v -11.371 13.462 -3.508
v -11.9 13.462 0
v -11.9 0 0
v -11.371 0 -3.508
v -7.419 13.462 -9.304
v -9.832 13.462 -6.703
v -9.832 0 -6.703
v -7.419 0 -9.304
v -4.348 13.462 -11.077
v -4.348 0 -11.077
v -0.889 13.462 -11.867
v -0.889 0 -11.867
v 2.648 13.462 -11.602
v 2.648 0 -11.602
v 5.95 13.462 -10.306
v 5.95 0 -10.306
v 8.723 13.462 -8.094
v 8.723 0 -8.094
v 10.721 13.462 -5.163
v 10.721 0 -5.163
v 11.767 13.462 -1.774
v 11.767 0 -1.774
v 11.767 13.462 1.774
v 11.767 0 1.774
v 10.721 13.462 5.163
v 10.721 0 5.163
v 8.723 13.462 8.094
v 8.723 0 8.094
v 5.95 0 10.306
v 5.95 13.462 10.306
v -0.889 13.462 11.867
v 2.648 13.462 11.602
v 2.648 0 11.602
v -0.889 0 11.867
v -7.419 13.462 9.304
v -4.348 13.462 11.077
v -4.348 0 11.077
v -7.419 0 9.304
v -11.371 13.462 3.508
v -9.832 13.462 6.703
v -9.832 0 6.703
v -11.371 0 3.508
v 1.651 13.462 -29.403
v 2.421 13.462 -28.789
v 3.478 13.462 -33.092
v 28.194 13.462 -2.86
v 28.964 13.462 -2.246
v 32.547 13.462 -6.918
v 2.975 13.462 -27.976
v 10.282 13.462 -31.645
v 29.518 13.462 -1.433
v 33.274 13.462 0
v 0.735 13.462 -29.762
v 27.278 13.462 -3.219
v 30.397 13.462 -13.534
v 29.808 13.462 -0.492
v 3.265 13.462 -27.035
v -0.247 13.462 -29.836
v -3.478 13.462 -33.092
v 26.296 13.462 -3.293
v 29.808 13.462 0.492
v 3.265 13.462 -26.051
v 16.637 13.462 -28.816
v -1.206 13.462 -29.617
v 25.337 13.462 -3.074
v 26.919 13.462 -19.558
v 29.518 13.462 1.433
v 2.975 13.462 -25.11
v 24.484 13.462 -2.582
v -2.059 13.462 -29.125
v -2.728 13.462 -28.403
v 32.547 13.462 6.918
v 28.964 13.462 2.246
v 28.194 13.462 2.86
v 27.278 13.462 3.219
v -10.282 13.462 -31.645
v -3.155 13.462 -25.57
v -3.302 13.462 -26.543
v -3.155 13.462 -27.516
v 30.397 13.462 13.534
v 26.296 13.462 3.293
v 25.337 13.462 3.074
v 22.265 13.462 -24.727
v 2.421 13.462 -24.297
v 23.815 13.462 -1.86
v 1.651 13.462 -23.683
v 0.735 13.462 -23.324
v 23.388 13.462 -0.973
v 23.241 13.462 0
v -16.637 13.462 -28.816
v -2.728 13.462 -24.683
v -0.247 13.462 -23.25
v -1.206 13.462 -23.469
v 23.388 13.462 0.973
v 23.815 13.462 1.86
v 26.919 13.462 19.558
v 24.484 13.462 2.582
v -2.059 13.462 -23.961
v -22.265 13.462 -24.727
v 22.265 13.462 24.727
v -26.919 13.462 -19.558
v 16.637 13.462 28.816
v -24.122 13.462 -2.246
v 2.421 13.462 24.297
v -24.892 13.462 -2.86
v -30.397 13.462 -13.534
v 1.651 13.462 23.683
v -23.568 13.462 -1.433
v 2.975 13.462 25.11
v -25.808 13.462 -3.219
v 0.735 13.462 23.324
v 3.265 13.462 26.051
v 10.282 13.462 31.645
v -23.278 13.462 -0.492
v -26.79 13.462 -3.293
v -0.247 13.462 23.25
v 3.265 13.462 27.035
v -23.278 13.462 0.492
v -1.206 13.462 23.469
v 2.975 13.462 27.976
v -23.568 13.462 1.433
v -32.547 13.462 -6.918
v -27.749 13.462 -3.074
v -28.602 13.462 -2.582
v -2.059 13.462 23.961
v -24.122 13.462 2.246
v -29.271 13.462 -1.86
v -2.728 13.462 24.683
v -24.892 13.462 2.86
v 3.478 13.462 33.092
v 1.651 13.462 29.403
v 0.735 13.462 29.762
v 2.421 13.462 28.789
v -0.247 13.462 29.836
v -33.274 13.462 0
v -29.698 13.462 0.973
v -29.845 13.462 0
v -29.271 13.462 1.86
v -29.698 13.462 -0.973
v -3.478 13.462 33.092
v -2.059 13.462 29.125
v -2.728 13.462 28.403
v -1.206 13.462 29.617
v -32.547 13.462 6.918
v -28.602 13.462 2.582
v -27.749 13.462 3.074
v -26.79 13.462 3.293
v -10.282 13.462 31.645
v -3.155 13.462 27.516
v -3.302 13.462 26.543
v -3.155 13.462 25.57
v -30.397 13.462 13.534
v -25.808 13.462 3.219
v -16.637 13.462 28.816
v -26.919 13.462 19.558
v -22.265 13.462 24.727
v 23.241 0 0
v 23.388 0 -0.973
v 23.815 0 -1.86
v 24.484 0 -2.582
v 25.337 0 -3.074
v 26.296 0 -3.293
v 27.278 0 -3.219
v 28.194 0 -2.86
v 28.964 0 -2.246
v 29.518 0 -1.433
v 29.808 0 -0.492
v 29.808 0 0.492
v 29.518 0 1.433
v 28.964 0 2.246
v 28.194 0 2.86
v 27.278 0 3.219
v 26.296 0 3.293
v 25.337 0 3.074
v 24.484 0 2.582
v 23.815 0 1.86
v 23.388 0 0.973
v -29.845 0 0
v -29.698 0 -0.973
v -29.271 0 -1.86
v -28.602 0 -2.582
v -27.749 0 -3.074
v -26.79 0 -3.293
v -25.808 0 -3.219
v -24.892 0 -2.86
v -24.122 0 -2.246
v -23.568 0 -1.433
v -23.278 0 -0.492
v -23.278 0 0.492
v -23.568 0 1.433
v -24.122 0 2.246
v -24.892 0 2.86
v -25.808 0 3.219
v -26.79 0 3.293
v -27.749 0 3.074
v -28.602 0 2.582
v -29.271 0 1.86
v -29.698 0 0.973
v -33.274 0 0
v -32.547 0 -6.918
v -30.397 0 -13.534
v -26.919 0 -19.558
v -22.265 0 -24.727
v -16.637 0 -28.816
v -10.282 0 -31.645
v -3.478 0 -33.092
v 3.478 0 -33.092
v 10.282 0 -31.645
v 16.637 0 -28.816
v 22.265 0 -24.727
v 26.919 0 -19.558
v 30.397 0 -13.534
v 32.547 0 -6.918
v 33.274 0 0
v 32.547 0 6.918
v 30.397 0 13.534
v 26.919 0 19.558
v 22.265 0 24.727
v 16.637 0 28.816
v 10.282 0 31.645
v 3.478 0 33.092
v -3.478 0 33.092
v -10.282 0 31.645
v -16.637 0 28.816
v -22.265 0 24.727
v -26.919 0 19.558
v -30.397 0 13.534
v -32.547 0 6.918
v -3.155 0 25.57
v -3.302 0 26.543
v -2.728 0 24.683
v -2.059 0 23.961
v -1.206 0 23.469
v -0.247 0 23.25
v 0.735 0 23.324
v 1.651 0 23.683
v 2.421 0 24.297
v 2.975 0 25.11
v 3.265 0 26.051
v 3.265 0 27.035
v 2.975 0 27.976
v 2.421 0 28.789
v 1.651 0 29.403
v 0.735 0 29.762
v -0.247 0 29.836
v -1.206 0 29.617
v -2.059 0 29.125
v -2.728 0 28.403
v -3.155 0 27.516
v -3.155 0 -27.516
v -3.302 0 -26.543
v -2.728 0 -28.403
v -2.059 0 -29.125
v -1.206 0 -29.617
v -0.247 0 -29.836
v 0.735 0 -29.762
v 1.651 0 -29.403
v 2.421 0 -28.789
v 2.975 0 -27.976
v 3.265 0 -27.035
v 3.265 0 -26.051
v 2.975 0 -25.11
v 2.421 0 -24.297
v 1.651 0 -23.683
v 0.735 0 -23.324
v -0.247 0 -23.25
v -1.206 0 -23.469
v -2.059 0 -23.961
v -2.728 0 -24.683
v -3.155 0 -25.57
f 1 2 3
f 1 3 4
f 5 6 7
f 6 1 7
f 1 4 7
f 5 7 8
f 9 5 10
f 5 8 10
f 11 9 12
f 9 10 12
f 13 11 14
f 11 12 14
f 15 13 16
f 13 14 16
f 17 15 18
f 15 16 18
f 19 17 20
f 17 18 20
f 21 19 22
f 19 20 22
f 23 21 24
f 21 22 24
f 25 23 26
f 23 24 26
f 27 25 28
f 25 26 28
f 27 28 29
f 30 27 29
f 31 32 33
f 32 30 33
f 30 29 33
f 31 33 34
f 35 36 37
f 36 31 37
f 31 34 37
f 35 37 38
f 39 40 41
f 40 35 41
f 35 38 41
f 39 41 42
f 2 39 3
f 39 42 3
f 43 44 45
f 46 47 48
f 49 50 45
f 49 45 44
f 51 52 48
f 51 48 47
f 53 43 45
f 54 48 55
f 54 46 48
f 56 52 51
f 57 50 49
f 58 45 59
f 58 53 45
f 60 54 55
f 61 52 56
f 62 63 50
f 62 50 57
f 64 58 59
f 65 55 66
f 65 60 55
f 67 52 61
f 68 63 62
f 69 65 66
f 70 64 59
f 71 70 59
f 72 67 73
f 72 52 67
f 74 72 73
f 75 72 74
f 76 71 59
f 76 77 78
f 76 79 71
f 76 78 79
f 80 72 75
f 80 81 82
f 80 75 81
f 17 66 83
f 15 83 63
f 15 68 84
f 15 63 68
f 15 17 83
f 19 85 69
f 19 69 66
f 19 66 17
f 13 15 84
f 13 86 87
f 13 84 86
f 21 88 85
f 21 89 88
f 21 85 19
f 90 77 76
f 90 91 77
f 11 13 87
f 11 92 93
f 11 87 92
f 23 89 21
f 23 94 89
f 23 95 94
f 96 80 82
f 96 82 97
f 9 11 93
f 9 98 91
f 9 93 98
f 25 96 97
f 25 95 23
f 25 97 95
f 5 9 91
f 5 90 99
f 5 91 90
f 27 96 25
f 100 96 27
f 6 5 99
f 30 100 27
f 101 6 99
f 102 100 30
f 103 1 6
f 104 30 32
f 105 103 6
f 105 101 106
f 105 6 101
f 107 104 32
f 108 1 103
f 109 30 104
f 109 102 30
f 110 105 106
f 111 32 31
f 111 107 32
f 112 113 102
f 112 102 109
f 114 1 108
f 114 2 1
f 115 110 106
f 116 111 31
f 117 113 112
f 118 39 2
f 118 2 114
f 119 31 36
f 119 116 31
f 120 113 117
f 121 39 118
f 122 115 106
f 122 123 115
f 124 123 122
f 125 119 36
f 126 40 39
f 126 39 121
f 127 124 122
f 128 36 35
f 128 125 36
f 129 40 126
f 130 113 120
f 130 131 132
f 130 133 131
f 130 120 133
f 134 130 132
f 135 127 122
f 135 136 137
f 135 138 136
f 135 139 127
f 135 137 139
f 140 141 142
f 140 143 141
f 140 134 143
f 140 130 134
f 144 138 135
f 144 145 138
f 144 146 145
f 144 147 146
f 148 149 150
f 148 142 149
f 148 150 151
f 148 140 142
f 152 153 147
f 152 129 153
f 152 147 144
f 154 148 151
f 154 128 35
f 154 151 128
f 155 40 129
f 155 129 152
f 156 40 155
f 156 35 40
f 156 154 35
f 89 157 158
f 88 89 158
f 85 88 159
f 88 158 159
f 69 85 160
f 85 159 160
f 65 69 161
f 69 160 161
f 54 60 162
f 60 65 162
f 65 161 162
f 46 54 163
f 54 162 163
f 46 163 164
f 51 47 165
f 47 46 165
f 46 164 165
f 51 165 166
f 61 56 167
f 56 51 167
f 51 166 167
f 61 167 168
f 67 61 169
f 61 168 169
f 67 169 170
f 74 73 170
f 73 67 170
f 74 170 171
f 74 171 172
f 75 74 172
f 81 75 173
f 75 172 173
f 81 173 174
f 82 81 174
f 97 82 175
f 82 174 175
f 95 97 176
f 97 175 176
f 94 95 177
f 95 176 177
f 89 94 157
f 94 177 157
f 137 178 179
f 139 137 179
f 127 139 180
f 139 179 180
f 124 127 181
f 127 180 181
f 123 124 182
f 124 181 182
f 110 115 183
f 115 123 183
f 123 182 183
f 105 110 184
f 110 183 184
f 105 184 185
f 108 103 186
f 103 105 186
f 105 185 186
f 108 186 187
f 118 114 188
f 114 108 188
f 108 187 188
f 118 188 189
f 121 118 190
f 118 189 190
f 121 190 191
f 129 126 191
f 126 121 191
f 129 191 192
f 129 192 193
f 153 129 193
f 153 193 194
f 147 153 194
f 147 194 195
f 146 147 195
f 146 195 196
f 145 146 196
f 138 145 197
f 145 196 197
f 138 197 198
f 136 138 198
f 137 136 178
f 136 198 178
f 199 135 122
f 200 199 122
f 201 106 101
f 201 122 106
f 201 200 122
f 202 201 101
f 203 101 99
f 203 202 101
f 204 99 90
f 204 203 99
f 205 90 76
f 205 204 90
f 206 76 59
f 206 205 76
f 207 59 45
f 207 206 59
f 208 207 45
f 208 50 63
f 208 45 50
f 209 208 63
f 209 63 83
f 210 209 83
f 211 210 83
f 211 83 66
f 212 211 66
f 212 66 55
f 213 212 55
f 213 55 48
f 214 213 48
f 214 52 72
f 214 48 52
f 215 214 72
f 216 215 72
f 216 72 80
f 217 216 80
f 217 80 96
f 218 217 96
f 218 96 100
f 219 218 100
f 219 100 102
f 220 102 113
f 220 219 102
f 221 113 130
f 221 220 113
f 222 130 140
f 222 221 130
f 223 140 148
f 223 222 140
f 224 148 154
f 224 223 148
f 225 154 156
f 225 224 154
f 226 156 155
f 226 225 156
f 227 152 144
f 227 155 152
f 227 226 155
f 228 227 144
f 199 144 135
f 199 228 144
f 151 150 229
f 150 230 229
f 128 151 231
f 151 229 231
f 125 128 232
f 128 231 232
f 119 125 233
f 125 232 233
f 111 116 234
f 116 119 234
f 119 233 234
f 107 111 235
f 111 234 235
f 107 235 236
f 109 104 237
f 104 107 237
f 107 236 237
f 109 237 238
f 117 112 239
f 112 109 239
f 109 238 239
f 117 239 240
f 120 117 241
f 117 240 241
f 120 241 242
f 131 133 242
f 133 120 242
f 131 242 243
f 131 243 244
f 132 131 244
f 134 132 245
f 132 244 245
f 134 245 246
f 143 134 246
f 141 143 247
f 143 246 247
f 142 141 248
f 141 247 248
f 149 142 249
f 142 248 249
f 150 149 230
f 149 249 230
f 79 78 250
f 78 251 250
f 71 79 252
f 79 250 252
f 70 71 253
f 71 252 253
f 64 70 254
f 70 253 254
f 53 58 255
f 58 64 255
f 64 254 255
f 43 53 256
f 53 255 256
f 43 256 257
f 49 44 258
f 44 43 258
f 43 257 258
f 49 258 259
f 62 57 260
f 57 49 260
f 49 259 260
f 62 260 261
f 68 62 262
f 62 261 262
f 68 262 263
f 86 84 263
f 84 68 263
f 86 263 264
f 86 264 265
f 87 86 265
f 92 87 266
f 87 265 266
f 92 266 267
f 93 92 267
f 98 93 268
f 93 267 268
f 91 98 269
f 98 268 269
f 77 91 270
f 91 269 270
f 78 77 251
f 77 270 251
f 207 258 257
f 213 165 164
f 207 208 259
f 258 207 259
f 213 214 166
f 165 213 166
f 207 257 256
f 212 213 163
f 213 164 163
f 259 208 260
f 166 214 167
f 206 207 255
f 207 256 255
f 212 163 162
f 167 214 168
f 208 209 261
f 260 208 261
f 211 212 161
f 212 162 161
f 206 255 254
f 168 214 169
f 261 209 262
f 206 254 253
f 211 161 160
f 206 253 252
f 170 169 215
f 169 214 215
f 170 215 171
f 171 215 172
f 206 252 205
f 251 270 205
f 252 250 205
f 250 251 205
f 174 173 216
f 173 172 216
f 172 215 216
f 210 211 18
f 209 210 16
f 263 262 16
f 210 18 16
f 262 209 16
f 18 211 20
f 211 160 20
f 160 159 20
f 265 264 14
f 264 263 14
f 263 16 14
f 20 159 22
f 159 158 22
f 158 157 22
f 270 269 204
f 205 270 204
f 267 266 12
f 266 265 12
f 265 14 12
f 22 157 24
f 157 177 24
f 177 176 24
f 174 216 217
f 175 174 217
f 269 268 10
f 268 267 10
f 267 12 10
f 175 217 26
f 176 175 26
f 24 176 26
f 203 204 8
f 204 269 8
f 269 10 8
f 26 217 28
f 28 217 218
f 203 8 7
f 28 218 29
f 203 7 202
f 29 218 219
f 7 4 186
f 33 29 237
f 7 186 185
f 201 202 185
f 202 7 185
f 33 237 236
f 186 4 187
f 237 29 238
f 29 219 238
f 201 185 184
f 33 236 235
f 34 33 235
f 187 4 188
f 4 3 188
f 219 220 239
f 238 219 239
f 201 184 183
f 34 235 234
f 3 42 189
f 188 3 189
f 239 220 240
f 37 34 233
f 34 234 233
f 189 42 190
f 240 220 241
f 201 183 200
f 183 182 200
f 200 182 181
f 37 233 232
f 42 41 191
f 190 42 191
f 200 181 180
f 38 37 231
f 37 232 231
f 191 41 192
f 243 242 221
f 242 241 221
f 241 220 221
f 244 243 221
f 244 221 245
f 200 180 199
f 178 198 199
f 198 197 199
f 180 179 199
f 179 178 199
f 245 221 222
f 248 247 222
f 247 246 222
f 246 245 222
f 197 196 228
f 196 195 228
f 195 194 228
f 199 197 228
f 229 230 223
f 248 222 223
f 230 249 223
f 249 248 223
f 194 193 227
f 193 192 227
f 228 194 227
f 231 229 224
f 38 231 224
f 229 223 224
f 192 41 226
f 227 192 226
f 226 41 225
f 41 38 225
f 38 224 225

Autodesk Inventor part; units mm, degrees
ref_plane "YZ Plane" through (0, 0, 0) normal (1, 0, 0) x (0, 1, 0)
ref_plane "XZ Plane" through (0, 0, 0) normal (0, 1, 0) x (-1, 0, 0)
ref_plane "XY Plane" through (0, 0, 0) normal (0, 0, 1) x (1, 0, 0)
sketch "Sketch1" plane through (0, 0, 0) normal (0, 1, 0) x (-1, 0, 0)
  circle A0 centre (0, 0) radius 33.274
  circle A1 centre (0, 0) radius 26.543 construction
  circle A2 centre (0, 26.543) radius 3.302
  circle A3 centre (26.543, 0) radius 3.302
  circle A4 centre (0, -26.543) radius 3.302
  circle A5 centre (-26.543, 0) radius 3.302
  circle A6 centre (0, 0) radius 11.8999
  dimension "d0" = 66.548
  dimension "d1" = 53.086
  dimension "d2" = 6.604
  dimension "d3" = 6.604
  dimension "d4" = 6.604
  dimension "d5" = 6.604
  dimension "d6" = 23.7998
extrude "Extrusion1" add sketch "Sketch1" along normal blind 13.462
thread "Thread1" size "15/16-16 UN" class "2B" standard "ANSI Unified Screw Threads" full length
properties part number "Flange" material "Polycarbonate, Clear"
